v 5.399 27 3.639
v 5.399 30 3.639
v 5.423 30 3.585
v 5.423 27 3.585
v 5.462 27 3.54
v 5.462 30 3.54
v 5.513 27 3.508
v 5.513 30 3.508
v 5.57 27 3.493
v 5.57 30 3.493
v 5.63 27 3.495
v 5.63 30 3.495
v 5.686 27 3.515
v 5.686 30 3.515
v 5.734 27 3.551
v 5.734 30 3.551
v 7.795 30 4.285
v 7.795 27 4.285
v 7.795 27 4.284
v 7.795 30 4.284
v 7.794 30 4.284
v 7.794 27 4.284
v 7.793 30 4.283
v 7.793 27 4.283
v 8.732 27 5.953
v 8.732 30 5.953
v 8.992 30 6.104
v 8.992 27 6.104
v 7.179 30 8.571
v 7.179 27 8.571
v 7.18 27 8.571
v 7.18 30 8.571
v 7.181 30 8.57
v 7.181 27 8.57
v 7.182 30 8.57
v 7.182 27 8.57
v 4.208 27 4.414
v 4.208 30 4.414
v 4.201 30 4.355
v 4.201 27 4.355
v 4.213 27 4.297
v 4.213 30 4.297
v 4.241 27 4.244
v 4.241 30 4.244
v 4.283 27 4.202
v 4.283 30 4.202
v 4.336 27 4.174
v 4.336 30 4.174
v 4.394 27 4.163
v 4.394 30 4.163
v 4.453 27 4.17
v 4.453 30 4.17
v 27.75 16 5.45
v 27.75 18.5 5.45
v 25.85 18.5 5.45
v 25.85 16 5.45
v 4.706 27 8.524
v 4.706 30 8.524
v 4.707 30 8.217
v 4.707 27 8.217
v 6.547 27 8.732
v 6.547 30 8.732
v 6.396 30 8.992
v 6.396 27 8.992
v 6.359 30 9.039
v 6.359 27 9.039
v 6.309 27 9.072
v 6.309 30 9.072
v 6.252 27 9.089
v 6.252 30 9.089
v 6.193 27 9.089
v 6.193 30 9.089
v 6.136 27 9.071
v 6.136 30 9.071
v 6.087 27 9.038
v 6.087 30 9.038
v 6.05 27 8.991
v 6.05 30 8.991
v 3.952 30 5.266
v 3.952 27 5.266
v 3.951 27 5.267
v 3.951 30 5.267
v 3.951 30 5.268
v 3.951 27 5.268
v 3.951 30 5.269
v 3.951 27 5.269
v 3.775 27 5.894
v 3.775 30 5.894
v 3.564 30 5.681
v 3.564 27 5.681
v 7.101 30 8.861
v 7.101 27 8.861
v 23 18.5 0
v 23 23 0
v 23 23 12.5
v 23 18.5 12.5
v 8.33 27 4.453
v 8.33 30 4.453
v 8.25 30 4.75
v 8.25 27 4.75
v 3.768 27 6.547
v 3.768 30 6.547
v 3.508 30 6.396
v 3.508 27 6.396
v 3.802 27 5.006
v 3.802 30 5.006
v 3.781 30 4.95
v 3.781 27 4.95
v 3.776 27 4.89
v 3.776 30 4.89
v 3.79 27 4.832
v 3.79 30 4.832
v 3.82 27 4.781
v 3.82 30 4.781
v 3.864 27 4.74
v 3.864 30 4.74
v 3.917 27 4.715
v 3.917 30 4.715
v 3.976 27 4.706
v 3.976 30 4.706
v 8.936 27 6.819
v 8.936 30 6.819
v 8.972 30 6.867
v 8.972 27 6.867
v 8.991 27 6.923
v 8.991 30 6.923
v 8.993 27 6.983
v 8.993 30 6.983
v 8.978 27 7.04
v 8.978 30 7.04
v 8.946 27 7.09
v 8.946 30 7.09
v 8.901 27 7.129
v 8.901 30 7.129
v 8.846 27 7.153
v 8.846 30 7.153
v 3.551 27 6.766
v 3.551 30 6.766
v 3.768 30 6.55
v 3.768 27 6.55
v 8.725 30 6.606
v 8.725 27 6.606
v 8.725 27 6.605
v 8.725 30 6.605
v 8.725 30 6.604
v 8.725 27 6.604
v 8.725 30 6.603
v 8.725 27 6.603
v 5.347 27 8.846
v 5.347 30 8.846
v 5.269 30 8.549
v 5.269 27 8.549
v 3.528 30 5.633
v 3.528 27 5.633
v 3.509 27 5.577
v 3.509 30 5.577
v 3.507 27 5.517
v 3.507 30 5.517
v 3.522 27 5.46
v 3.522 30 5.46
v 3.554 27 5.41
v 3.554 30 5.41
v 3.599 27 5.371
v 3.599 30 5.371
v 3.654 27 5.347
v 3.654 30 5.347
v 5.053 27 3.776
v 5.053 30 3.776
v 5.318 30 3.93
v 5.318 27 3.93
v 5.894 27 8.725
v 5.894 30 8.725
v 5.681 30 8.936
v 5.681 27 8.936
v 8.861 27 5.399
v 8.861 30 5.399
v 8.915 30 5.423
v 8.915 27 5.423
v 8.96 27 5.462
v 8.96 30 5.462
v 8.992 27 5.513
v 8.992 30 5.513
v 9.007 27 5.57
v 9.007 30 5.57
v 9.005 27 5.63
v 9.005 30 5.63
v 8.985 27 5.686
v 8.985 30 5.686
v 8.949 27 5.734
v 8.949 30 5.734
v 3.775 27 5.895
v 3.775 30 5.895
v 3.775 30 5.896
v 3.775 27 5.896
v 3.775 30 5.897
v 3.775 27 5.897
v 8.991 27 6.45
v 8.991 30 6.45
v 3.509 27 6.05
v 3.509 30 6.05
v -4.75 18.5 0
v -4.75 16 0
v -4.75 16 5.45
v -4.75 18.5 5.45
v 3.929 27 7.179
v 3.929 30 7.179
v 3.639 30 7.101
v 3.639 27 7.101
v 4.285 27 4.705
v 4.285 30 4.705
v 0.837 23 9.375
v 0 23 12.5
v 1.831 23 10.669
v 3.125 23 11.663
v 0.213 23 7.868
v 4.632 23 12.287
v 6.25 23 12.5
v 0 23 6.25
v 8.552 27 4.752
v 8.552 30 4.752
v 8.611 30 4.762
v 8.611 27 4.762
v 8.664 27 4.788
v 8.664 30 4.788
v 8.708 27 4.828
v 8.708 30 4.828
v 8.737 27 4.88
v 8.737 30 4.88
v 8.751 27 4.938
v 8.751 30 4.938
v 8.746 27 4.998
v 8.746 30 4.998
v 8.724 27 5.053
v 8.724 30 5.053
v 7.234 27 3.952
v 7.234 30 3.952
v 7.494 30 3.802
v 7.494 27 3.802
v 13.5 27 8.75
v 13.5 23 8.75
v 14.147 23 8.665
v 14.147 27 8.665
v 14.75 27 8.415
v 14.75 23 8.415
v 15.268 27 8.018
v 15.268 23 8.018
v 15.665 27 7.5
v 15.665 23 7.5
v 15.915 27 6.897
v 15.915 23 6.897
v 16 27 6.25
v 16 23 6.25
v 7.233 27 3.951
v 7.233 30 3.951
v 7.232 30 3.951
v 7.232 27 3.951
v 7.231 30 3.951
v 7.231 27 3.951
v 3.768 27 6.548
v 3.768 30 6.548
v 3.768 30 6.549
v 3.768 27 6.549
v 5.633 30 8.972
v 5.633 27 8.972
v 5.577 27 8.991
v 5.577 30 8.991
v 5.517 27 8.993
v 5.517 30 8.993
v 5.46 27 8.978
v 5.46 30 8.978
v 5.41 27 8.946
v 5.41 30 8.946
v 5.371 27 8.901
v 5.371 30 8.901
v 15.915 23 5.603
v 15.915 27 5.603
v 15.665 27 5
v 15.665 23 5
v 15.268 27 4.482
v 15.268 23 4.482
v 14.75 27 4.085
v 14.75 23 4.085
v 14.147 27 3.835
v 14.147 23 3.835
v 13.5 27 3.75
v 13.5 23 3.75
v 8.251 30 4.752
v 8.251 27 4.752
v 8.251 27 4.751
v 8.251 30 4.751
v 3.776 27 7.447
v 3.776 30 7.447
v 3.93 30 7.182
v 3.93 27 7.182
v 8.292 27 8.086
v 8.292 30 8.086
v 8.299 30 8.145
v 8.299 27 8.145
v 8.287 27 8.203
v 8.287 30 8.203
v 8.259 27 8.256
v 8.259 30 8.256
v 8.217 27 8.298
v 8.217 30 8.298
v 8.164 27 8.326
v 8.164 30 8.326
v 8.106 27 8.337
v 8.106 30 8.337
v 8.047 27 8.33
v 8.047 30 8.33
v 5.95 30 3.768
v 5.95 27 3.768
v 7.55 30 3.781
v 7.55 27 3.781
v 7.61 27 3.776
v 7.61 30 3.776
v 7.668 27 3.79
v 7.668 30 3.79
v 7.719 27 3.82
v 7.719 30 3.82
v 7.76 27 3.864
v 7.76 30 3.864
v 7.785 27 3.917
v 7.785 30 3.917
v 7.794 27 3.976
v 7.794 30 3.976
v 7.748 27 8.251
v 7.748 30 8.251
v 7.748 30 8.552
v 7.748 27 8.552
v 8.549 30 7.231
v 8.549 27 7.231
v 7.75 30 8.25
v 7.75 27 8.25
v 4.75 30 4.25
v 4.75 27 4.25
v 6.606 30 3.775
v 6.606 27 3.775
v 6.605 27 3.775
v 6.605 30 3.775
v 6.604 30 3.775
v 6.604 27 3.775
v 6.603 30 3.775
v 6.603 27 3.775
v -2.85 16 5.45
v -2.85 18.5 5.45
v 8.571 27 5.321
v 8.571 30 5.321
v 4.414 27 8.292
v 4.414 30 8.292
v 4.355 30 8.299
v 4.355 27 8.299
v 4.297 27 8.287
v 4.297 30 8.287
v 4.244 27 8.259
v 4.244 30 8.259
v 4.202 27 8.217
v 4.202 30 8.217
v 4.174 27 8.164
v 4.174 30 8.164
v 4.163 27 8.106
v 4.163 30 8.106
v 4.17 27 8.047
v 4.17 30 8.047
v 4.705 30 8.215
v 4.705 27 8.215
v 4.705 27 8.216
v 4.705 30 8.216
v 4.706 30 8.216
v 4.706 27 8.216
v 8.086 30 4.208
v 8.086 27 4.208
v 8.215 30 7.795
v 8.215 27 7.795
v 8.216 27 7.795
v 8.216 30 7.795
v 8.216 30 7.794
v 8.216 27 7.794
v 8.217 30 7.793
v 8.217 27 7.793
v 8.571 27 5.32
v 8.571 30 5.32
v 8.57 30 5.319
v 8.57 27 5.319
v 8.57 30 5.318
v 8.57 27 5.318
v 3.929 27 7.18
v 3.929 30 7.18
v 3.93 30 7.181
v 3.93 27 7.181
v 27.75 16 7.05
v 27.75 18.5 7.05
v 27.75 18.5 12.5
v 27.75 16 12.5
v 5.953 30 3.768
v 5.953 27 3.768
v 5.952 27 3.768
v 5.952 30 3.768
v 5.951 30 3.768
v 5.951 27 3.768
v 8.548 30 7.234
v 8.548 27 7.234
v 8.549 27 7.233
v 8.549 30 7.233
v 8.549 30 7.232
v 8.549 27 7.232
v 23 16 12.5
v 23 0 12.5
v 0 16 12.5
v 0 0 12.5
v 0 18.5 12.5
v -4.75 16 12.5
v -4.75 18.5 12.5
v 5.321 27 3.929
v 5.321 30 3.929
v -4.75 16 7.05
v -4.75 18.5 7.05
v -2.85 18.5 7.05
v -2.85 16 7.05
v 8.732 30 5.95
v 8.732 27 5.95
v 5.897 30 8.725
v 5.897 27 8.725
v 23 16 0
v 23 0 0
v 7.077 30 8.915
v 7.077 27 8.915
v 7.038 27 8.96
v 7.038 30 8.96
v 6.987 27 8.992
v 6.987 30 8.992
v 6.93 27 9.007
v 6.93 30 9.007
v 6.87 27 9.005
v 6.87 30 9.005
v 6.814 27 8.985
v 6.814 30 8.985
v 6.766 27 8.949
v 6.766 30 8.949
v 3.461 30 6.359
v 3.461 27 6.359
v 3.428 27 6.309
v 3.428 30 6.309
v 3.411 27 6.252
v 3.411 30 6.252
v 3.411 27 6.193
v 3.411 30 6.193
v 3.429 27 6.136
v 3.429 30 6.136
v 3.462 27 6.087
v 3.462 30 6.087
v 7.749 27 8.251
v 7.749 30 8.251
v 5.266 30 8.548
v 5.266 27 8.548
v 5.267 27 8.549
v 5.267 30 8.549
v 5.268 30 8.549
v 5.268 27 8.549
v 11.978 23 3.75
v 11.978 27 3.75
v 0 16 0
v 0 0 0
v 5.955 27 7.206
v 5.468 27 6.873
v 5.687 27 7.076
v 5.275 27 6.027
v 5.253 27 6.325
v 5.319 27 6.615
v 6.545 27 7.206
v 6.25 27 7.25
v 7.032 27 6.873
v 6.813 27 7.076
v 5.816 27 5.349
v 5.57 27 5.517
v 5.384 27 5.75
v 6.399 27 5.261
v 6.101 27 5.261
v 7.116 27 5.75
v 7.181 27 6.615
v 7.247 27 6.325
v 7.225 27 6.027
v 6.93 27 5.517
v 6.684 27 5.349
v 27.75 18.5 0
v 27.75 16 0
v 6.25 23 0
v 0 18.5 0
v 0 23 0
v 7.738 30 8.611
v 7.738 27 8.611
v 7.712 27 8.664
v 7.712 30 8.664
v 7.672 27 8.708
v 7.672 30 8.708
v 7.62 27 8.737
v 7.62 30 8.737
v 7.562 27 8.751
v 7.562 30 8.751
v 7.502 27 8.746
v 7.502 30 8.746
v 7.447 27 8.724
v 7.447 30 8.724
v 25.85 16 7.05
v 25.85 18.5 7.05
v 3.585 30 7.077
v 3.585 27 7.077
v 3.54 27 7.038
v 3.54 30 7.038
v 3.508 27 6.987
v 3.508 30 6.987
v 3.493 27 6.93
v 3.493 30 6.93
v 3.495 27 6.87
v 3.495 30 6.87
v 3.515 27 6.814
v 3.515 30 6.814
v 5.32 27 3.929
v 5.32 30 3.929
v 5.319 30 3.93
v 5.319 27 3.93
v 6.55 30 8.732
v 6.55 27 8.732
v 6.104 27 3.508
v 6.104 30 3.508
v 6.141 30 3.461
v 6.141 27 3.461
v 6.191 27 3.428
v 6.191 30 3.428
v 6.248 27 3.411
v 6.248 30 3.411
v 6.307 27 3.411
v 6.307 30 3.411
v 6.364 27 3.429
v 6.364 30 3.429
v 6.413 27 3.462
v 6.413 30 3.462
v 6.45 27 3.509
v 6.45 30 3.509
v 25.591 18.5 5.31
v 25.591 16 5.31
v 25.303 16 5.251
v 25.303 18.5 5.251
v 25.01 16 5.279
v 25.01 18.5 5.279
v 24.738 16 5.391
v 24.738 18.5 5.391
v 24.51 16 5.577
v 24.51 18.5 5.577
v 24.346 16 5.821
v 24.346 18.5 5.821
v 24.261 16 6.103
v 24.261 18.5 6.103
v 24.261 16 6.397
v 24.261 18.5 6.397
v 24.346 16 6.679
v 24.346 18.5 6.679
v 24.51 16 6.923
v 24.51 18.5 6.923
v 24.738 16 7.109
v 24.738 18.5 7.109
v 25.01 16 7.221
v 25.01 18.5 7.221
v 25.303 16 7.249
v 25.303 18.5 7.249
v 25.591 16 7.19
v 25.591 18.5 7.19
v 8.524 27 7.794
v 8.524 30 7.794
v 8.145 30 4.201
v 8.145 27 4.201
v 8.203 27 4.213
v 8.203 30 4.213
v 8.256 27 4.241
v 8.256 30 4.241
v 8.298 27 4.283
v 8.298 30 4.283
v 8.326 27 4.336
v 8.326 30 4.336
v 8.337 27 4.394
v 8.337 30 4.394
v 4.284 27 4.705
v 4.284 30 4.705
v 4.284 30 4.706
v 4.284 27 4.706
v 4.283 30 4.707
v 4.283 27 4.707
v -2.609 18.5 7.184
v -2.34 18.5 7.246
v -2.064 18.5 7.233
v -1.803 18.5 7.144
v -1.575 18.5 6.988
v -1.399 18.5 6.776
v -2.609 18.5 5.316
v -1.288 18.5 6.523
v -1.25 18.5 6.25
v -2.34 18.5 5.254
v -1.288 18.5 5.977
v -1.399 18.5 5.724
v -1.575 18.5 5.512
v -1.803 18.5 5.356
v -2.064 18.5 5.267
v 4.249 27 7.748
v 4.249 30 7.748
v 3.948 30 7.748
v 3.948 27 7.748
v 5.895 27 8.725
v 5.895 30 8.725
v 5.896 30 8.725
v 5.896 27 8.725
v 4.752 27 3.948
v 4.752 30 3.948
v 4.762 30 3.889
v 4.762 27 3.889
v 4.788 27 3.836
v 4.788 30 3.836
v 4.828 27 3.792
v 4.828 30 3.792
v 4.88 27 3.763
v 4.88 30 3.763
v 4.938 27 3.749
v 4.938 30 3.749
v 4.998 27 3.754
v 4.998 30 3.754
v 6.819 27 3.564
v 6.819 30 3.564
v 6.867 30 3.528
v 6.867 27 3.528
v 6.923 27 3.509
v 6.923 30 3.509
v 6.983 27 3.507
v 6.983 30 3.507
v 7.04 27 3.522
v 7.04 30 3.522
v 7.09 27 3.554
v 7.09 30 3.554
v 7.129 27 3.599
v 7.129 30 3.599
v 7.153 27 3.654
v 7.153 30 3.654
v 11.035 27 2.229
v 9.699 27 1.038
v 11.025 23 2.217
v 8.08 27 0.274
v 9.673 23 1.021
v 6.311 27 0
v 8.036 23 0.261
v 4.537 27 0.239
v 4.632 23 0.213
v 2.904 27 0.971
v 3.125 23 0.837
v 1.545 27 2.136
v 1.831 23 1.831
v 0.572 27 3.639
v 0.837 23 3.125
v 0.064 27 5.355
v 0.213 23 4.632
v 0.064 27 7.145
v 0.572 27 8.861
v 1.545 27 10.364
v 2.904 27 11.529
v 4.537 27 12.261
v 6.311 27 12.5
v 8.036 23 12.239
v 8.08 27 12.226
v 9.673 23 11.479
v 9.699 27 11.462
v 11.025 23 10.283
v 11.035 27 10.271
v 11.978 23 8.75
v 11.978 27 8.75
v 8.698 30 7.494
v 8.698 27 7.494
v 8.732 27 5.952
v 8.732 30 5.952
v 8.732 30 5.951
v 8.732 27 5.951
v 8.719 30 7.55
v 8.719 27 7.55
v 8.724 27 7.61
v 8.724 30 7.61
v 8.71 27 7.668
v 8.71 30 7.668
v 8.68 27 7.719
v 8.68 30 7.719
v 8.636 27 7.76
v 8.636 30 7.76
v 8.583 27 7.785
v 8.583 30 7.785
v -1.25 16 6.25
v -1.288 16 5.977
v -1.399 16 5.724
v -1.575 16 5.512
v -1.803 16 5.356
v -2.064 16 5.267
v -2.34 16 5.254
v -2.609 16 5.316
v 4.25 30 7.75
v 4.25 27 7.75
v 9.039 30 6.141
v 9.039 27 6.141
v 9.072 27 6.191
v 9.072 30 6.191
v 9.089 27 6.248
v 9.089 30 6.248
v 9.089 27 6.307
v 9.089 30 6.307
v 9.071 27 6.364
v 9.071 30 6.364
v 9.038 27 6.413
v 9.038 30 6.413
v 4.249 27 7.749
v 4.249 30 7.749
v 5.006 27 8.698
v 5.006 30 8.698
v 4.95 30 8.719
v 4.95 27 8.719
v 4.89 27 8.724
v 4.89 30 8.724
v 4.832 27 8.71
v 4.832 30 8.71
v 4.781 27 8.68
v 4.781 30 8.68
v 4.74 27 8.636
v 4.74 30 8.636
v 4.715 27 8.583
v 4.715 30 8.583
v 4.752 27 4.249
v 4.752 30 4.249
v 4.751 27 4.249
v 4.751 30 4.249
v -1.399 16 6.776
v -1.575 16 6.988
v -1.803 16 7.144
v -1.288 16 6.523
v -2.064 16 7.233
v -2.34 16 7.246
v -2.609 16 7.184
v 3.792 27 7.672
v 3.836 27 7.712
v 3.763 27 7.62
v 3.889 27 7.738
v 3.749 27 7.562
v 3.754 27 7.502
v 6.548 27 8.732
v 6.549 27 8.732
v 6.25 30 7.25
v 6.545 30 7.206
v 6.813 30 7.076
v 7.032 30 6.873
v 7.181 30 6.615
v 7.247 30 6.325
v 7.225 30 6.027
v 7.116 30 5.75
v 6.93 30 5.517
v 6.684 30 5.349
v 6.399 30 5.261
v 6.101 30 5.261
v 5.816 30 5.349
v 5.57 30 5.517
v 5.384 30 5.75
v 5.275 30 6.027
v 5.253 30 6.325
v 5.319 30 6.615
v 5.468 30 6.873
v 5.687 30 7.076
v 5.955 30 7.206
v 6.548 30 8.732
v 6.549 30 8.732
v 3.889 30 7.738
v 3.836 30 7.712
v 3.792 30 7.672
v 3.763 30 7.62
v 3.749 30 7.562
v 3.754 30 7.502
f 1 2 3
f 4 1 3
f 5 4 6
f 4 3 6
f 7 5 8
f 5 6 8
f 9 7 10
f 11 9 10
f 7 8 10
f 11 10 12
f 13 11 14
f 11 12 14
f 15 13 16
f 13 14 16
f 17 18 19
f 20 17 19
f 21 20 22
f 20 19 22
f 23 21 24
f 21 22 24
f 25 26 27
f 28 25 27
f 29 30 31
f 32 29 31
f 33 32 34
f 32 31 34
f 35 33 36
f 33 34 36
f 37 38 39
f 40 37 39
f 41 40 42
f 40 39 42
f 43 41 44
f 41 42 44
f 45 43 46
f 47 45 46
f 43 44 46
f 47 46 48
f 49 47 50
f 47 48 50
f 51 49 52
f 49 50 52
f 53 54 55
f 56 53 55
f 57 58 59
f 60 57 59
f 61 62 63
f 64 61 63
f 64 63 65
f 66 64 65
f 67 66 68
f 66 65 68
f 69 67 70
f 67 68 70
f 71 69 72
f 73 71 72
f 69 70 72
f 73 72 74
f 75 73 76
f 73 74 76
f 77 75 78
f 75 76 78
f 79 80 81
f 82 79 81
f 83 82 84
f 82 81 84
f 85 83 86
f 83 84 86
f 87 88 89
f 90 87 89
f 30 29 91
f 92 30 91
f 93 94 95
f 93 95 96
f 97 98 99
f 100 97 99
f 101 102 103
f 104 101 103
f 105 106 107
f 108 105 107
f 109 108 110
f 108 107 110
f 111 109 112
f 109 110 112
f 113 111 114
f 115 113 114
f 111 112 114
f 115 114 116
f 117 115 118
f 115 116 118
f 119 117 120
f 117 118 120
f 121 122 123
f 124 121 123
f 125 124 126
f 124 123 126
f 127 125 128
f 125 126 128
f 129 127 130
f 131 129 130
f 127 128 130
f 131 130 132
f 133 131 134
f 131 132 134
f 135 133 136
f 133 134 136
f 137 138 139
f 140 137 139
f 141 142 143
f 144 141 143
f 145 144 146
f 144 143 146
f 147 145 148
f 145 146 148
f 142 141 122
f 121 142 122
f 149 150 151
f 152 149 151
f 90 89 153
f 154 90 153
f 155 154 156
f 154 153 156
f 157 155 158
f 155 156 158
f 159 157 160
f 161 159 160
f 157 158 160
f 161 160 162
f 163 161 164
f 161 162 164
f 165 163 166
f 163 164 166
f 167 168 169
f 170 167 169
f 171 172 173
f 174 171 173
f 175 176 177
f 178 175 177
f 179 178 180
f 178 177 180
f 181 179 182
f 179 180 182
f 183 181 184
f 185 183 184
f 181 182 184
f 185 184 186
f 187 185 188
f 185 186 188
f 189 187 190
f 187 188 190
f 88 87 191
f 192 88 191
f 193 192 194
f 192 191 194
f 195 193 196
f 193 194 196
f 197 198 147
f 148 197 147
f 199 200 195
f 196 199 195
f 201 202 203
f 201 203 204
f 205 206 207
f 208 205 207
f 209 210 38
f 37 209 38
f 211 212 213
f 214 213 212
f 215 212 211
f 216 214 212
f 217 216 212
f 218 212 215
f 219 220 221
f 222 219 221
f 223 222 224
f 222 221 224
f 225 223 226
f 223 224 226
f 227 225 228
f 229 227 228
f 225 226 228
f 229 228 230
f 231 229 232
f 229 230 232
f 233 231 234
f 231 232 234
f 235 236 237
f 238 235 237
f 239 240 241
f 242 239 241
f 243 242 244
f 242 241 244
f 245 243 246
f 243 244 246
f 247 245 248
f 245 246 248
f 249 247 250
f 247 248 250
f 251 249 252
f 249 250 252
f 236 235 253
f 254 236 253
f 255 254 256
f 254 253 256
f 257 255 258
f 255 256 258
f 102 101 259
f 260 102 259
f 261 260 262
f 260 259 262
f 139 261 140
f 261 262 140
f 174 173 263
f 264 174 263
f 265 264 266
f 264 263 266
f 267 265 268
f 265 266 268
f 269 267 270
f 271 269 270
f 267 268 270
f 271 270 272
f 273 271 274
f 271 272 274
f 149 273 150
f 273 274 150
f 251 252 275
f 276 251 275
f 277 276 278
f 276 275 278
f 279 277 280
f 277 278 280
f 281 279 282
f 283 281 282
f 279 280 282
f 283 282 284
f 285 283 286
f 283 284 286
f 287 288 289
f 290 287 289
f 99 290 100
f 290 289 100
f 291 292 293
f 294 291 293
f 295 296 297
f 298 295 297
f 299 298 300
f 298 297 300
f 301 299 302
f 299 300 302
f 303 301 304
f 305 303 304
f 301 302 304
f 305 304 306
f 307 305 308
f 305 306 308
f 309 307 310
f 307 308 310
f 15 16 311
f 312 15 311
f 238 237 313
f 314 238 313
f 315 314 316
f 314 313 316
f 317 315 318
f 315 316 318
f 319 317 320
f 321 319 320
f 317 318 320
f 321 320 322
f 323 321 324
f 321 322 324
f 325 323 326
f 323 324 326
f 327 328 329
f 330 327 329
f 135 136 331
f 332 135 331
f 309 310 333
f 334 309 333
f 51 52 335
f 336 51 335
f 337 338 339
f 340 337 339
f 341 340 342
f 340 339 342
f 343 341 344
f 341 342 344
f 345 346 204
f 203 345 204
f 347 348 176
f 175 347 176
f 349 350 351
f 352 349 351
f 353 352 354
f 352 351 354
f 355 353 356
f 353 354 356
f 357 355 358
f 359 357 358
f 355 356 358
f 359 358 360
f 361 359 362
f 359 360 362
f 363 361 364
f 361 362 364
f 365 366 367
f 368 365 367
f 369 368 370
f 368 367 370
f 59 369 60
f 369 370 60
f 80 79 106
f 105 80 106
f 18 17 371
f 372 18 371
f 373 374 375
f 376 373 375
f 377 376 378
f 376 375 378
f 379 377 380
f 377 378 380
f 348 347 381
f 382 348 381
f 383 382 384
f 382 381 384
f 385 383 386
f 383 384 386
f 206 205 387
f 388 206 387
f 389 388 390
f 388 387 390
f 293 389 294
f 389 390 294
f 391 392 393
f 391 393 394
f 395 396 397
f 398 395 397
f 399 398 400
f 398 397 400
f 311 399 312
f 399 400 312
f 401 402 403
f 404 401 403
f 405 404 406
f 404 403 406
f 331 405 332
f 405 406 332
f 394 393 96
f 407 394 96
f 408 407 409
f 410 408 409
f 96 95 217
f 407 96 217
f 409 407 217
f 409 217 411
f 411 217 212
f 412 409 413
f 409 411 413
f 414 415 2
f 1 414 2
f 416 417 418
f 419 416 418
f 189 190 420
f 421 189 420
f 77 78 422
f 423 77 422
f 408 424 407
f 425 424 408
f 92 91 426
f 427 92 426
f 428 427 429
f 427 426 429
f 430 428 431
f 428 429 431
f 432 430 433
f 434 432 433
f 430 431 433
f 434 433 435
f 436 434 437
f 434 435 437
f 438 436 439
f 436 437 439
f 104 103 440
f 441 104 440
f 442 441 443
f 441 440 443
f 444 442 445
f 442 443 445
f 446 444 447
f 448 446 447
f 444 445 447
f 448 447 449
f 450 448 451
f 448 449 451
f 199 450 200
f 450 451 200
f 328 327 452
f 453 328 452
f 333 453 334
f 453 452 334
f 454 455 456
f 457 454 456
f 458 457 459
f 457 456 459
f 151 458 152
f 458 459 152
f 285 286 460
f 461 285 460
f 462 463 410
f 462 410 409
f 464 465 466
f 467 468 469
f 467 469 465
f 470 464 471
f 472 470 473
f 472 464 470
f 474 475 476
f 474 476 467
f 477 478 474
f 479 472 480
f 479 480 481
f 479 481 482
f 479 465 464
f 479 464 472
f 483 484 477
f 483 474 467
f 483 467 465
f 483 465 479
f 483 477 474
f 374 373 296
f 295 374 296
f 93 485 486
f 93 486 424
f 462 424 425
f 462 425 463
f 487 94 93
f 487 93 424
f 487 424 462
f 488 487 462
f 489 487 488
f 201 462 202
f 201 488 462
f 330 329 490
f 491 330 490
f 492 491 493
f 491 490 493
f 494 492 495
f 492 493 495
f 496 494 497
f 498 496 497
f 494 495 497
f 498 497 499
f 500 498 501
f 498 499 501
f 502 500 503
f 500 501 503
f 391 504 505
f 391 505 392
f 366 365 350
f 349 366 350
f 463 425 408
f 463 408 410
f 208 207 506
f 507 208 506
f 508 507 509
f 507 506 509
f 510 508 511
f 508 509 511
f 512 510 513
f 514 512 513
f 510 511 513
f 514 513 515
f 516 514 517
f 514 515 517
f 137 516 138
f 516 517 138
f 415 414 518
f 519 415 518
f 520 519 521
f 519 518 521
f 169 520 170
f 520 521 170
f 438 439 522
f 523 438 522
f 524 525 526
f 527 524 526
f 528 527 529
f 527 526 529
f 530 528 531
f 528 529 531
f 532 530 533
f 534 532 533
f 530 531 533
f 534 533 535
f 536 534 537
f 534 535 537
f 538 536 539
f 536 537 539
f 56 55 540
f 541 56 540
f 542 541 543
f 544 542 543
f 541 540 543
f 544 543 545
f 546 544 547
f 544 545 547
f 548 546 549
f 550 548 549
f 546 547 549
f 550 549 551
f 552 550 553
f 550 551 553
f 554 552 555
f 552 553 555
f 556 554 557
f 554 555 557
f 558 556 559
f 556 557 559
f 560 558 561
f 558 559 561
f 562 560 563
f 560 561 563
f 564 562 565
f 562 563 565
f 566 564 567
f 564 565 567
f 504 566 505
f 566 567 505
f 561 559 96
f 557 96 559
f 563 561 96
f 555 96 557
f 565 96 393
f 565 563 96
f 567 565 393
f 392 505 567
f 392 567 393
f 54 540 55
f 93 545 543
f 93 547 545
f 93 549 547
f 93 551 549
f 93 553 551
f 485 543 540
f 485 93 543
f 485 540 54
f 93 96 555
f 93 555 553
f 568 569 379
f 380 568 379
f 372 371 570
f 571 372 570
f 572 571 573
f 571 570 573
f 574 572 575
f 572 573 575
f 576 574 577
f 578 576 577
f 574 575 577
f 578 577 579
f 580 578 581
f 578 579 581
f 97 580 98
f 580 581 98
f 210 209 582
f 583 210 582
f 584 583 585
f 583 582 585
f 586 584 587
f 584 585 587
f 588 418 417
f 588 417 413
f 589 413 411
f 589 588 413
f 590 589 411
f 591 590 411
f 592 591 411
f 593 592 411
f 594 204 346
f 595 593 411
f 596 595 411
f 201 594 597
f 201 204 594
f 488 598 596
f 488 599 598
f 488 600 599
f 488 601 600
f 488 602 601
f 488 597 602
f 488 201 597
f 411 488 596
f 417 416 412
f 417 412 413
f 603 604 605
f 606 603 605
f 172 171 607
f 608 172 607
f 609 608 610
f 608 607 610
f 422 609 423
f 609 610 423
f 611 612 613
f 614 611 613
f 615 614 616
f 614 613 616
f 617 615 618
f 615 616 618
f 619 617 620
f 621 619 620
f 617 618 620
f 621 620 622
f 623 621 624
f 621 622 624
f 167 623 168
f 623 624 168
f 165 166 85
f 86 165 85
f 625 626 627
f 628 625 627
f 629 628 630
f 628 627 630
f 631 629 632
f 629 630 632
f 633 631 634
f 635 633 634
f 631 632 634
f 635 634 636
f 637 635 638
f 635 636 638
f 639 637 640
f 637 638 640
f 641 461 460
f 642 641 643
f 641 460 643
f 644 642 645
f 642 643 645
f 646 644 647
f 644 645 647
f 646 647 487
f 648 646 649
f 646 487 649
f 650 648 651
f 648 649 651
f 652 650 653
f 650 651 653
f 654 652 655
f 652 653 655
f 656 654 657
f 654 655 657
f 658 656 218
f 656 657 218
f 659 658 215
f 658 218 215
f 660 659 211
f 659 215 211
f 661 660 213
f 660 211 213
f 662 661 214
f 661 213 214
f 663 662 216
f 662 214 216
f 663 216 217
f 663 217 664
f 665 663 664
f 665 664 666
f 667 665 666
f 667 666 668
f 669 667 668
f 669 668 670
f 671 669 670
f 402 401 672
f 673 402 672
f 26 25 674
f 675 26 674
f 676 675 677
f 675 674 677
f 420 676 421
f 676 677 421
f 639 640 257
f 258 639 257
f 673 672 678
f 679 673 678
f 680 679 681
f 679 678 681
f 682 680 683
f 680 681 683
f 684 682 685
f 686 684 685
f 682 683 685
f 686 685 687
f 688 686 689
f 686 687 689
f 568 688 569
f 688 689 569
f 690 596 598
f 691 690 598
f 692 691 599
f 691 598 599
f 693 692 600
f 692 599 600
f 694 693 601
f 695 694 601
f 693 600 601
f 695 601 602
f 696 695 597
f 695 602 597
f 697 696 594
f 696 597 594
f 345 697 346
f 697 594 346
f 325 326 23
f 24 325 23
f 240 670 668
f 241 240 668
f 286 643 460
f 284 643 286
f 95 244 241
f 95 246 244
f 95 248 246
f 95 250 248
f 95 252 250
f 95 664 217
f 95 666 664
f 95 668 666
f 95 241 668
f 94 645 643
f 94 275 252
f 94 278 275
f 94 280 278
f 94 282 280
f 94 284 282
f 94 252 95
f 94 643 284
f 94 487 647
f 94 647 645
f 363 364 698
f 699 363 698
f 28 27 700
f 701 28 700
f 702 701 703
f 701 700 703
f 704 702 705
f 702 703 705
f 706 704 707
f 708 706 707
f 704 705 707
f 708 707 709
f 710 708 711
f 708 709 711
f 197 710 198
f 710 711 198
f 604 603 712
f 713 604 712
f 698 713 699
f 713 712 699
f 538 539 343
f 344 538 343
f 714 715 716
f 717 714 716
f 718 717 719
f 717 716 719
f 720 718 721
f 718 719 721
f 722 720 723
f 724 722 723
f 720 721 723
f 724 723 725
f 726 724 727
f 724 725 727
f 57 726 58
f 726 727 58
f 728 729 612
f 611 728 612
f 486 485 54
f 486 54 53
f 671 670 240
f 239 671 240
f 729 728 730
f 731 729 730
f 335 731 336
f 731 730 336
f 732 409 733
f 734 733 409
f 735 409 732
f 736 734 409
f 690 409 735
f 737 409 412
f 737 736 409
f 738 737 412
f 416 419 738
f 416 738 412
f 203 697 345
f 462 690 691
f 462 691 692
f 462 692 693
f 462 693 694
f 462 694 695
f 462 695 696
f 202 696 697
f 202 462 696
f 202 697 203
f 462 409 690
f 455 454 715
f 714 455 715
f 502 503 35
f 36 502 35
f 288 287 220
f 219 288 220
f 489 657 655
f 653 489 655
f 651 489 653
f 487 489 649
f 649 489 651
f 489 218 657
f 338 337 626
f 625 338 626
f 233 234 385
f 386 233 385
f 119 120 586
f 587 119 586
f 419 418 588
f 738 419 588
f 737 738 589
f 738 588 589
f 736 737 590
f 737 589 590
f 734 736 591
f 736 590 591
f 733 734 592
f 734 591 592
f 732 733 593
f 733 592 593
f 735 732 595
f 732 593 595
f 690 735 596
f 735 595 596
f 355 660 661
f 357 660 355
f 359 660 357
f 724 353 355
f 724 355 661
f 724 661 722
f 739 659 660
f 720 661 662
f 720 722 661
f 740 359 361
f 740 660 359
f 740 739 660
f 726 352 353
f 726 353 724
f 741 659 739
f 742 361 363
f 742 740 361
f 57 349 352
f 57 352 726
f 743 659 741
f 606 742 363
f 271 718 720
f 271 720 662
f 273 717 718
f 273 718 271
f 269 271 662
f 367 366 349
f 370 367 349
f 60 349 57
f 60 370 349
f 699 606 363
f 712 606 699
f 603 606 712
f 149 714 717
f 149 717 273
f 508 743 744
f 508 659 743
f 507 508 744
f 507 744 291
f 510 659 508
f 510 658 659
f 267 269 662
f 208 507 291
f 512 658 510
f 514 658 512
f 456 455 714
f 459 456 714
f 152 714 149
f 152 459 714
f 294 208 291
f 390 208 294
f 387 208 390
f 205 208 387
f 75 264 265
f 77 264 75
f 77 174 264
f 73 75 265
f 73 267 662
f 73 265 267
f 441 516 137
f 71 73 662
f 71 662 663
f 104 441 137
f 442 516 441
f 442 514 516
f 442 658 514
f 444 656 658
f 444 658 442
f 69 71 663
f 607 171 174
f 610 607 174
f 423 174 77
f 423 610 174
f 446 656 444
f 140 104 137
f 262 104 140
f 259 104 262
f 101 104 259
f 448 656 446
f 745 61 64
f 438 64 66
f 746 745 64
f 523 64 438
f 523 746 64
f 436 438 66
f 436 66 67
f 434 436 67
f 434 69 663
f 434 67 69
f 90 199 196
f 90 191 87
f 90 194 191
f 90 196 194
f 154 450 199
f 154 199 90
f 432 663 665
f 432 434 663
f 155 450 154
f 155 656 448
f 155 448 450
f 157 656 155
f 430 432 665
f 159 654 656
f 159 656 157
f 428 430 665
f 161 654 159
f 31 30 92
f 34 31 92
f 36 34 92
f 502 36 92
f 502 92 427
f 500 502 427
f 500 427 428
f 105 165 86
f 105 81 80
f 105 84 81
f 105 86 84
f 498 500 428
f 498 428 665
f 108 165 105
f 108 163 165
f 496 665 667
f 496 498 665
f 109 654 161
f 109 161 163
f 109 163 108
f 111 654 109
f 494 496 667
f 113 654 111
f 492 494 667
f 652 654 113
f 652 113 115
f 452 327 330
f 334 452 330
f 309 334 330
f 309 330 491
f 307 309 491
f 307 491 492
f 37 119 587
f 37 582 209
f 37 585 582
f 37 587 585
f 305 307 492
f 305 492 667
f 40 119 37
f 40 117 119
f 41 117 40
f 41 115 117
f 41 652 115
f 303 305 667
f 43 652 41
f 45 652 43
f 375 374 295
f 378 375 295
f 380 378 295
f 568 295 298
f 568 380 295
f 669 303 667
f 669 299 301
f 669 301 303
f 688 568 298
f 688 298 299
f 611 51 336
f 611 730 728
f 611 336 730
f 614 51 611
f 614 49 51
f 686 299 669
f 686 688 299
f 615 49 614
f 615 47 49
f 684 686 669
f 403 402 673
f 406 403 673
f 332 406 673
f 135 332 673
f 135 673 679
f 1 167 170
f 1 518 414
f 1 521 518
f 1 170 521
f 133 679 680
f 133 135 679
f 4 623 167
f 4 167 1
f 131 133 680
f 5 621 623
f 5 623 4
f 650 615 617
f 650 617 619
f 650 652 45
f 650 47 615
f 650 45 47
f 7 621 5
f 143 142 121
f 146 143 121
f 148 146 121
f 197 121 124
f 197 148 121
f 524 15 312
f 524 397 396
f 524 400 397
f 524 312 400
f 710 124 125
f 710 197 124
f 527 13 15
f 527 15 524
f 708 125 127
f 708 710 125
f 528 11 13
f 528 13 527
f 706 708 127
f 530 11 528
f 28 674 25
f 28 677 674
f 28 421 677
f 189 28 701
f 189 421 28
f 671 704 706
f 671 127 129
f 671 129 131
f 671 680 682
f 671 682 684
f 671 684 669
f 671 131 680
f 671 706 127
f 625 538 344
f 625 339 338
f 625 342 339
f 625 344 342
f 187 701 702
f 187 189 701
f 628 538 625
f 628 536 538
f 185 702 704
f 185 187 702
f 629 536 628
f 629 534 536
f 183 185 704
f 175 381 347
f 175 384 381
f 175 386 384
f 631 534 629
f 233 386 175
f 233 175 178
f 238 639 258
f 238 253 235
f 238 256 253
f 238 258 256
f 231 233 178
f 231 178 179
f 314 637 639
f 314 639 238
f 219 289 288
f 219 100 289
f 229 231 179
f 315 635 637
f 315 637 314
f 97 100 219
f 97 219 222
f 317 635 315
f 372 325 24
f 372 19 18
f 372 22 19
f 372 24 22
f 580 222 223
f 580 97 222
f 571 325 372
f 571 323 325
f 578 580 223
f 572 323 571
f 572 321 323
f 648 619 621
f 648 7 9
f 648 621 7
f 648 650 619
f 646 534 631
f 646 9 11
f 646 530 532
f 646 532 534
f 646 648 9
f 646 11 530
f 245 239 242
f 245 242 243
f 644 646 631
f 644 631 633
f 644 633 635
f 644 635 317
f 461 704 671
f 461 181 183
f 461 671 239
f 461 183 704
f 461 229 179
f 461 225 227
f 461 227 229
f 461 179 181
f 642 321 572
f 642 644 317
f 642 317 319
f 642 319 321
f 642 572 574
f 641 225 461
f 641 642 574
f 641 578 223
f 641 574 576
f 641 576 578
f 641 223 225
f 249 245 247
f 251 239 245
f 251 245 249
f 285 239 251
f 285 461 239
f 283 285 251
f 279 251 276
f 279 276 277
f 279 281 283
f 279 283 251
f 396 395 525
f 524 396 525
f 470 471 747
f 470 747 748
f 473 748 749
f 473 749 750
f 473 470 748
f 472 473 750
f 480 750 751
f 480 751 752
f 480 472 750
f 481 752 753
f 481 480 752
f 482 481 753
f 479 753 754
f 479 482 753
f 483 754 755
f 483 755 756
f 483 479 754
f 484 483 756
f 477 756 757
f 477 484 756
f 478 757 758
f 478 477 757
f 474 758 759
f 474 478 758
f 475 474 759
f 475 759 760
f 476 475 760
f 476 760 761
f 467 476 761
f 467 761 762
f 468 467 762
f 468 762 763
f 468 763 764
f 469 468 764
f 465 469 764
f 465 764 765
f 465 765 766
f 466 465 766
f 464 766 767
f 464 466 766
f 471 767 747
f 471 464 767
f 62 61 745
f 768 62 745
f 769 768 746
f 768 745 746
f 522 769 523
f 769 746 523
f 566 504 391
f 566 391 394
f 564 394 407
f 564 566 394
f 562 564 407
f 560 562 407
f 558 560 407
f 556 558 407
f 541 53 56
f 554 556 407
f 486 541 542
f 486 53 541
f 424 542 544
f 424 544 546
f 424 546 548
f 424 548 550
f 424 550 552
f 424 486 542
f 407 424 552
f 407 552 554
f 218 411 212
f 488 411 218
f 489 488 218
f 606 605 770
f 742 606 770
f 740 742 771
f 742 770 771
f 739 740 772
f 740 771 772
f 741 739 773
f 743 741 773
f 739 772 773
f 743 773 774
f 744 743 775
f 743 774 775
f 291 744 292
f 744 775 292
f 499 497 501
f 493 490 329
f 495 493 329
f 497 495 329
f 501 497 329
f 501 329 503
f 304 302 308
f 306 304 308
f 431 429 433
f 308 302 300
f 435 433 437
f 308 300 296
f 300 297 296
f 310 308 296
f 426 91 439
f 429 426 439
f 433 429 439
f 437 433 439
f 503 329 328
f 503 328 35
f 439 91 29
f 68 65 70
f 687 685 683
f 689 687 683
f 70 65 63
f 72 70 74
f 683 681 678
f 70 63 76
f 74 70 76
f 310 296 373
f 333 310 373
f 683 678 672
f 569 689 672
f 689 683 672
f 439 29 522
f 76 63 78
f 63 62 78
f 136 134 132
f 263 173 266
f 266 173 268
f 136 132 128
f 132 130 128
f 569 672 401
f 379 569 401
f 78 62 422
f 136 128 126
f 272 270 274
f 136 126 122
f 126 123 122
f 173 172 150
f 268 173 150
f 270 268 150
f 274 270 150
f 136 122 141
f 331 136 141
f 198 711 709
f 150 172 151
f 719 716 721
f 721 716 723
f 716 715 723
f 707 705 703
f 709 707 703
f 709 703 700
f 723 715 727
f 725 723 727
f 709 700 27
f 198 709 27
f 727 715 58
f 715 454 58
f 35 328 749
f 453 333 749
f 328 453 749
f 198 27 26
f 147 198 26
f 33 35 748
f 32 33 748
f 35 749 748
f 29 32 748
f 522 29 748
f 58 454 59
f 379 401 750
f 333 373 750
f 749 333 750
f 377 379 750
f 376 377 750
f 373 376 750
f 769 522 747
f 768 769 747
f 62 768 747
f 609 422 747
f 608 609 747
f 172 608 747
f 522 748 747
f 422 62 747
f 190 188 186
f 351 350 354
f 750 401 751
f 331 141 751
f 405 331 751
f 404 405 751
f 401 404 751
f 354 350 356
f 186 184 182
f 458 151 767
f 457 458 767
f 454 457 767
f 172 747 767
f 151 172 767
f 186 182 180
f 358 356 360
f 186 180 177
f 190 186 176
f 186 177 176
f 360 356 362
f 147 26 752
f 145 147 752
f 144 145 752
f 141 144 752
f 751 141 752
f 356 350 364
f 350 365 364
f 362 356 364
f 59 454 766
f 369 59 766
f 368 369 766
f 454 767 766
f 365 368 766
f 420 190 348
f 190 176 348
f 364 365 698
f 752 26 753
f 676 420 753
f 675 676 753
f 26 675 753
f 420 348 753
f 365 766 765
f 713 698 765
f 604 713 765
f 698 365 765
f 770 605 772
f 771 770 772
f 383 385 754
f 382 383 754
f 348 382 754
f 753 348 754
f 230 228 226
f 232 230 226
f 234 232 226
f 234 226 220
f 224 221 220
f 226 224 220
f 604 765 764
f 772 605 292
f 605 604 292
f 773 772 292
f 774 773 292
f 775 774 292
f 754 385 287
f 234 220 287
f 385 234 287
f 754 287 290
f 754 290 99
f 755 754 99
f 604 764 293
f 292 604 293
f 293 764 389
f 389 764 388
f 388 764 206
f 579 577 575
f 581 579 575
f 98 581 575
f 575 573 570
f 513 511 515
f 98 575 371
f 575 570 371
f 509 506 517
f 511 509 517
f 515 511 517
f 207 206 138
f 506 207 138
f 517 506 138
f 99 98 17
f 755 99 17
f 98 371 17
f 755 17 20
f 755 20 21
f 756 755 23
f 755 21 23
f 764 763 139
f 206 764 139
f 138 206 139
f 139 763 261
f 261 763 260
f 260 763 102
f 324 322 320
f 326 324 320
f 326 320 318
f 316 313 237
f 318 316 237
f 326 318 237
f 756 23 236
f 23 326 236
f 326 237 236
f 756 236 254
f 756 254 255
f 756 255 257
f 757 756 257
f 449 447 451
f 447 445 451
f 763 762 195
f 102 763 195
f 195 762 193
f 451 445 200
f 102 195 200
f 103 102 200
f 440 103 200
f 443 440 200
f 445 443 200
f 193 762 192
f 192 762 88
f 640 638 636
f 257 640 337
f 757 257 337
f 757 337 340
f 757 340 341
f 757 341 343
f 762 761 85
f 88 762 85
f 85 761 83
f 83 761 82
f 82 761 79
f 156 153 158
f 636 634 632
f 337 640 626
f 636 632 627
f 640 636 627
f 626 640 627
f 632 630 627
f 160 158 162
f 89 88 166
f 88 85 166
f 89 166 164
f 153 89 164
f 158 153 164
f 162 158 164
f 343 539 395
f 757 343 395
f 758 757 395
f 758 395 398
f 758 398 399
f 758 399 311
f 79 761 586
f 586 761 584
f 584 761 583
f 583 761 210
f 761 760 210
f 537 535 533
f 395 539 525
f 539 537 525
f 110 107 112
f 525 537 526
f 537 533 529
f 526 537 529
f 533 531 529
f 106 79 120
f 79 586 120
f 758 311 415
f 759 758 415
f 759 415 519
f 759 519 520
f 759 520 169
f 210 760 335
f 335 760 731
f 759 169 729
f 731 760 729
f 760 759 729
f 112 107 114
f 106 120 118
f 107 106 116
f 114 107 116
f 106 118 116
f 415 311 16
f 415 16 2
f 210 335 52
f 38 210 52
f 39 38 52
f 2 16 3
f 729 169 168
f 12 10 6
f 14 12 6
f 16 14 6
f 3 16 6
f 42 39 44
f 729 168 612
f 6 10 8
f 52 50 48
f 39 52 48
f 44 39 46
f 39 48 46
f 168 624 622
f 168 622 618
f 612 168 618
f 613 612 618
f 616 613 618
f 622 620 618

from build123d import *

# Parameters (mm, degrees)
RESSALTO_EXTRUS_O1_DEPTH = 12.5
CORTE_EXTRUS_O1_DEPTH    = 36.616885041
ESBO_O3_R                = 6.25
ESBO_O3_R_2              = 2.5
RESSALTO_EXTRUS_O3_DEPTH = 4
ESBO_O4_R                = 2.5
ESBO_O4_R_2              = 1
RESSALTO_EXTRUS_O4_DEPTH = 3
RESSALTO_EXTRUS_O5_DEPTH = 3
PADR_OCIRCULAR1_COUNT    = 24


with BuildPart() as part:
    # Esboço1 → Ressalto-extrusão1 (new body)
    with BuildSketch(Plane.XY):
        Polygon((0, 0), (0, 16), (-4.75, 16), (-4.75, 18.5), (0, 18.5), (0, 23), (23, 23), (23, 18.5), (27.75, 18.5), (27.75, 16), (23, 16), (23, 0), align=None)
    extrude(amount=RESSALTO_EXTRUS_O1_DEPTH)

    # Esboço2 → Corte-extrusão1 (cut, through all)
    with BuildSketch(Plane(origin=(0, 18.5, 0), x_dir=(1, 0, 0), z_dir=(0, 1, 0))):
        with BuildLine():
            ThreePointArc((-2.85, -7.05), (-3.25, -6.25), (-2.85, -5.45))
            Line((-2.85, -5.45), (-4.75, -5.45))
            Line((-4.75, -5.45), (-4.75, -7.05))
            Line((-4.75, -7.05), (-2.85, -7.05))
        make_face()
        with BuildLine():
            ThreePointArc((-1.25, -6.25), (-1.802786405, -5.355572809), (-2.85, -5.45))
            Line((-2.85, -5.45), (-2.85, -7.05))
            ThreePointArc((-2.85, -7.05), (-1.802786405, -7.144427191), (-1.25, -6.25))
        make_face()
        with BuildLine():
            Line((-2.85, -7.05), (-2.85, -5.45))
            ThreePointArc((-2.85, -5.45), (-3.25, -6.25), (-2.85, -7.05))
        make_face()
        with BuildLine():
            ThreePointArc((26.25, -6.25), (26.144427191, -5.802786405), (25.85, -5.45))
            Line((25.85, -5.45), (25.85, -7.05))
            ThreePointArc((25.85, -7.05), (26.144427191, -6.697213595), (26.25, -6.25))
        make_face()
        with BuildLine():
            Line((25.85, -7.05), (25.85, -5.45))
            ThreePointArc((25.85, -5.45), (24.25, -6.25), (25.85, -7.05))
        make_face()
        with BuildLine():
            Line((27.75, -5.45), (25.85, -5.45))
            ThreePointArc((25.85, -5.45), (26.144427191, -5.802786405), (26.25, -6.25))
            ThreePointArc((26.25, -6.25), (26.144427191, -6.697213595), (25.85, -7.05))
            Line((25.85, -7.05), (27.75, -7.05))
            Line((27.75, -7.05), (27.75, -5.45))
        make_face()
    extrude(amount=-CORTE_EXTRUS_O1_DEPTH, mode=Mode.SUBTRACT)

    # Esboço3 → Ressalto-extrusão3 (add)
    with BuildSketch(Plane(origin=(0, 23, 0), x_dir=(1, 0, 0), z_dir=(0, 1, 0))):
        with BuildLine():
            ThreePointArc((12.137931034, -4.153629772), (12.789692169, -3.8530305), (13.5, -3.75))
            Line((13.5, -3.75), (11.978219619, -3.75))
            ThreePointArc((11.978219619, -3.75), (12.061580529, -3.95042792), (12.137931034, -4.153629772))
        make_face()
        with BuildLine():
            Line((11.978219619, -8.75), (13.5, -8.75))
            ThreePointArc((13.5, -8.75), (12.789692169, -8.6469695), (12.137931034, -8.346370228))
            ThreePointArc((12.137931034, -8.346370228), (12.061580529, -8.54957208), (11.978219619, -8.75))
        make_face()
        with BuildLine():
            ThreePointArc((12.137931034, -8.346370228), (12.789692169, -8.6469695), (13.5, -8.75))
            Line((13.5, -8.75), (13.5, -3.75))
            ThreePointArc((13.5, -3.75), (12.789692169, -3.8530305), (12.137931034, -4.153629772))
            ThreePointArc((12.137931034, -4.153629772), (12.408817621, -5.186296321), (12.5, -6.25))
            ThreePointArc((12.5, -6.25), (12.408817621, -7.313703679), (12.137931034, -8.346370228))
        make_face()
        with BuildLine():
            Line((13.5, -3.75), (13.5, -8.75))
            ThreePointArc((13.5, -8.75), (15.267766953, -8.017766953), (16, -6.25))
            ThreePointArc((16, -6.25), (15.267766953, -4.482233047), (13.5, -3.75))
        make_face()
        with Locations((6.25, -6.25)):
            Circle(ESBO_O3_R)
        with Locations((13.5, -6.25)):
            Circle(ESBO_O3_R_2)
        with BuildLine():
            Line((8.733610526, -8.75), (11.978219619, -8.75))
            ThreePointArc((11.978219619, -8.75), (12.061580529, -8.54957208), (12.137931034, -8.346370228))
            ThreePointArc((12.137931034, -8.346370228), (11, -6.25), (12.137931034, -4.153629772))
            ThreePointArc((12.137931034, -4.153629772), (12.061580529, -3.95042792), (11.978219619, -3.75))
            Line((11.978219619, -3.75), (8.733610526, -3.75))
            Line((8.733610526, -3.75), (8.733610526, -8.75))
        make_face()
        with BuildLine():
            ThreePointArc((11.978219619, -3.75), (0, -6.25), (11.978219619, -8.75))
            Line((11.978219619, -8.75), (8.733610526, -8.75))
            Line((8.733610526, -8.75), (8.733610526, -3.75))
            Line((8.733610526, -3.75), (11.978219619, -3.75))
        make_face()
    extrude(amount=RESSALTO_EXTRUS_O3_DEPTH)

    # Esboço4 → Ressalto-extrusão4 (add)
    with BuildSketch(Plane(origin=(0, 27, 0), x_dir=(1, 0, 0), z_dir=(0, 1, 0))):
        with Locations(Location((6.25, -6.25, 0), (0, 0, 270))):
            Circle(ESBO_O4_R)
        with Locations(Location((6.25, -6.25, 0), (0, 0, 270))):
            Circle(ESBO_O4_R_2, mode=Mode.SUBTRACT)
    extrude(amount=RESSALTO_EXTRUS_O4_DEPTH)

    # Esboço5 → Ressalto-extrusão5 (add)
    with BuildSketch(Plane(origin=(0, 30, 0), x_dir=(1, 0, 0), z_dir=(0, 1, 0))):
        with BuildLine():
            Line((5.952990595, -3.767705615), (6.103919204, -3.507984418))
            ThreePointArc((6.103919204, -3.507984418), (6.277405699, -3.408473433), (6.450327987, -3.508961652))
            Line((6.450327987, -3.508961652), (6.602949214, -3.77504003))
            Line((6.602949214, -3.77504003), (5.952990595, -3.767705615))
        make_face()
    ressalto_extrus_o5 = extrude(amount=-RESSALTO_EXTRUS_O5_DEPTH)

    # PadrãoCircular1: Ressalto-extrusão5 ×24 about axis
    padr_ocircular1_axis = Axis((6.25, 0, 6.25), (0, 1, 0))
    for i in range(1, PADR_OCIRCULAR1_COUNT):
        add(ressalto_extrus_o5.rotate(padr_ocircular1_axis, i * 360 / PADR_OCIRCULAR1_COUNT))


solid = part.part
